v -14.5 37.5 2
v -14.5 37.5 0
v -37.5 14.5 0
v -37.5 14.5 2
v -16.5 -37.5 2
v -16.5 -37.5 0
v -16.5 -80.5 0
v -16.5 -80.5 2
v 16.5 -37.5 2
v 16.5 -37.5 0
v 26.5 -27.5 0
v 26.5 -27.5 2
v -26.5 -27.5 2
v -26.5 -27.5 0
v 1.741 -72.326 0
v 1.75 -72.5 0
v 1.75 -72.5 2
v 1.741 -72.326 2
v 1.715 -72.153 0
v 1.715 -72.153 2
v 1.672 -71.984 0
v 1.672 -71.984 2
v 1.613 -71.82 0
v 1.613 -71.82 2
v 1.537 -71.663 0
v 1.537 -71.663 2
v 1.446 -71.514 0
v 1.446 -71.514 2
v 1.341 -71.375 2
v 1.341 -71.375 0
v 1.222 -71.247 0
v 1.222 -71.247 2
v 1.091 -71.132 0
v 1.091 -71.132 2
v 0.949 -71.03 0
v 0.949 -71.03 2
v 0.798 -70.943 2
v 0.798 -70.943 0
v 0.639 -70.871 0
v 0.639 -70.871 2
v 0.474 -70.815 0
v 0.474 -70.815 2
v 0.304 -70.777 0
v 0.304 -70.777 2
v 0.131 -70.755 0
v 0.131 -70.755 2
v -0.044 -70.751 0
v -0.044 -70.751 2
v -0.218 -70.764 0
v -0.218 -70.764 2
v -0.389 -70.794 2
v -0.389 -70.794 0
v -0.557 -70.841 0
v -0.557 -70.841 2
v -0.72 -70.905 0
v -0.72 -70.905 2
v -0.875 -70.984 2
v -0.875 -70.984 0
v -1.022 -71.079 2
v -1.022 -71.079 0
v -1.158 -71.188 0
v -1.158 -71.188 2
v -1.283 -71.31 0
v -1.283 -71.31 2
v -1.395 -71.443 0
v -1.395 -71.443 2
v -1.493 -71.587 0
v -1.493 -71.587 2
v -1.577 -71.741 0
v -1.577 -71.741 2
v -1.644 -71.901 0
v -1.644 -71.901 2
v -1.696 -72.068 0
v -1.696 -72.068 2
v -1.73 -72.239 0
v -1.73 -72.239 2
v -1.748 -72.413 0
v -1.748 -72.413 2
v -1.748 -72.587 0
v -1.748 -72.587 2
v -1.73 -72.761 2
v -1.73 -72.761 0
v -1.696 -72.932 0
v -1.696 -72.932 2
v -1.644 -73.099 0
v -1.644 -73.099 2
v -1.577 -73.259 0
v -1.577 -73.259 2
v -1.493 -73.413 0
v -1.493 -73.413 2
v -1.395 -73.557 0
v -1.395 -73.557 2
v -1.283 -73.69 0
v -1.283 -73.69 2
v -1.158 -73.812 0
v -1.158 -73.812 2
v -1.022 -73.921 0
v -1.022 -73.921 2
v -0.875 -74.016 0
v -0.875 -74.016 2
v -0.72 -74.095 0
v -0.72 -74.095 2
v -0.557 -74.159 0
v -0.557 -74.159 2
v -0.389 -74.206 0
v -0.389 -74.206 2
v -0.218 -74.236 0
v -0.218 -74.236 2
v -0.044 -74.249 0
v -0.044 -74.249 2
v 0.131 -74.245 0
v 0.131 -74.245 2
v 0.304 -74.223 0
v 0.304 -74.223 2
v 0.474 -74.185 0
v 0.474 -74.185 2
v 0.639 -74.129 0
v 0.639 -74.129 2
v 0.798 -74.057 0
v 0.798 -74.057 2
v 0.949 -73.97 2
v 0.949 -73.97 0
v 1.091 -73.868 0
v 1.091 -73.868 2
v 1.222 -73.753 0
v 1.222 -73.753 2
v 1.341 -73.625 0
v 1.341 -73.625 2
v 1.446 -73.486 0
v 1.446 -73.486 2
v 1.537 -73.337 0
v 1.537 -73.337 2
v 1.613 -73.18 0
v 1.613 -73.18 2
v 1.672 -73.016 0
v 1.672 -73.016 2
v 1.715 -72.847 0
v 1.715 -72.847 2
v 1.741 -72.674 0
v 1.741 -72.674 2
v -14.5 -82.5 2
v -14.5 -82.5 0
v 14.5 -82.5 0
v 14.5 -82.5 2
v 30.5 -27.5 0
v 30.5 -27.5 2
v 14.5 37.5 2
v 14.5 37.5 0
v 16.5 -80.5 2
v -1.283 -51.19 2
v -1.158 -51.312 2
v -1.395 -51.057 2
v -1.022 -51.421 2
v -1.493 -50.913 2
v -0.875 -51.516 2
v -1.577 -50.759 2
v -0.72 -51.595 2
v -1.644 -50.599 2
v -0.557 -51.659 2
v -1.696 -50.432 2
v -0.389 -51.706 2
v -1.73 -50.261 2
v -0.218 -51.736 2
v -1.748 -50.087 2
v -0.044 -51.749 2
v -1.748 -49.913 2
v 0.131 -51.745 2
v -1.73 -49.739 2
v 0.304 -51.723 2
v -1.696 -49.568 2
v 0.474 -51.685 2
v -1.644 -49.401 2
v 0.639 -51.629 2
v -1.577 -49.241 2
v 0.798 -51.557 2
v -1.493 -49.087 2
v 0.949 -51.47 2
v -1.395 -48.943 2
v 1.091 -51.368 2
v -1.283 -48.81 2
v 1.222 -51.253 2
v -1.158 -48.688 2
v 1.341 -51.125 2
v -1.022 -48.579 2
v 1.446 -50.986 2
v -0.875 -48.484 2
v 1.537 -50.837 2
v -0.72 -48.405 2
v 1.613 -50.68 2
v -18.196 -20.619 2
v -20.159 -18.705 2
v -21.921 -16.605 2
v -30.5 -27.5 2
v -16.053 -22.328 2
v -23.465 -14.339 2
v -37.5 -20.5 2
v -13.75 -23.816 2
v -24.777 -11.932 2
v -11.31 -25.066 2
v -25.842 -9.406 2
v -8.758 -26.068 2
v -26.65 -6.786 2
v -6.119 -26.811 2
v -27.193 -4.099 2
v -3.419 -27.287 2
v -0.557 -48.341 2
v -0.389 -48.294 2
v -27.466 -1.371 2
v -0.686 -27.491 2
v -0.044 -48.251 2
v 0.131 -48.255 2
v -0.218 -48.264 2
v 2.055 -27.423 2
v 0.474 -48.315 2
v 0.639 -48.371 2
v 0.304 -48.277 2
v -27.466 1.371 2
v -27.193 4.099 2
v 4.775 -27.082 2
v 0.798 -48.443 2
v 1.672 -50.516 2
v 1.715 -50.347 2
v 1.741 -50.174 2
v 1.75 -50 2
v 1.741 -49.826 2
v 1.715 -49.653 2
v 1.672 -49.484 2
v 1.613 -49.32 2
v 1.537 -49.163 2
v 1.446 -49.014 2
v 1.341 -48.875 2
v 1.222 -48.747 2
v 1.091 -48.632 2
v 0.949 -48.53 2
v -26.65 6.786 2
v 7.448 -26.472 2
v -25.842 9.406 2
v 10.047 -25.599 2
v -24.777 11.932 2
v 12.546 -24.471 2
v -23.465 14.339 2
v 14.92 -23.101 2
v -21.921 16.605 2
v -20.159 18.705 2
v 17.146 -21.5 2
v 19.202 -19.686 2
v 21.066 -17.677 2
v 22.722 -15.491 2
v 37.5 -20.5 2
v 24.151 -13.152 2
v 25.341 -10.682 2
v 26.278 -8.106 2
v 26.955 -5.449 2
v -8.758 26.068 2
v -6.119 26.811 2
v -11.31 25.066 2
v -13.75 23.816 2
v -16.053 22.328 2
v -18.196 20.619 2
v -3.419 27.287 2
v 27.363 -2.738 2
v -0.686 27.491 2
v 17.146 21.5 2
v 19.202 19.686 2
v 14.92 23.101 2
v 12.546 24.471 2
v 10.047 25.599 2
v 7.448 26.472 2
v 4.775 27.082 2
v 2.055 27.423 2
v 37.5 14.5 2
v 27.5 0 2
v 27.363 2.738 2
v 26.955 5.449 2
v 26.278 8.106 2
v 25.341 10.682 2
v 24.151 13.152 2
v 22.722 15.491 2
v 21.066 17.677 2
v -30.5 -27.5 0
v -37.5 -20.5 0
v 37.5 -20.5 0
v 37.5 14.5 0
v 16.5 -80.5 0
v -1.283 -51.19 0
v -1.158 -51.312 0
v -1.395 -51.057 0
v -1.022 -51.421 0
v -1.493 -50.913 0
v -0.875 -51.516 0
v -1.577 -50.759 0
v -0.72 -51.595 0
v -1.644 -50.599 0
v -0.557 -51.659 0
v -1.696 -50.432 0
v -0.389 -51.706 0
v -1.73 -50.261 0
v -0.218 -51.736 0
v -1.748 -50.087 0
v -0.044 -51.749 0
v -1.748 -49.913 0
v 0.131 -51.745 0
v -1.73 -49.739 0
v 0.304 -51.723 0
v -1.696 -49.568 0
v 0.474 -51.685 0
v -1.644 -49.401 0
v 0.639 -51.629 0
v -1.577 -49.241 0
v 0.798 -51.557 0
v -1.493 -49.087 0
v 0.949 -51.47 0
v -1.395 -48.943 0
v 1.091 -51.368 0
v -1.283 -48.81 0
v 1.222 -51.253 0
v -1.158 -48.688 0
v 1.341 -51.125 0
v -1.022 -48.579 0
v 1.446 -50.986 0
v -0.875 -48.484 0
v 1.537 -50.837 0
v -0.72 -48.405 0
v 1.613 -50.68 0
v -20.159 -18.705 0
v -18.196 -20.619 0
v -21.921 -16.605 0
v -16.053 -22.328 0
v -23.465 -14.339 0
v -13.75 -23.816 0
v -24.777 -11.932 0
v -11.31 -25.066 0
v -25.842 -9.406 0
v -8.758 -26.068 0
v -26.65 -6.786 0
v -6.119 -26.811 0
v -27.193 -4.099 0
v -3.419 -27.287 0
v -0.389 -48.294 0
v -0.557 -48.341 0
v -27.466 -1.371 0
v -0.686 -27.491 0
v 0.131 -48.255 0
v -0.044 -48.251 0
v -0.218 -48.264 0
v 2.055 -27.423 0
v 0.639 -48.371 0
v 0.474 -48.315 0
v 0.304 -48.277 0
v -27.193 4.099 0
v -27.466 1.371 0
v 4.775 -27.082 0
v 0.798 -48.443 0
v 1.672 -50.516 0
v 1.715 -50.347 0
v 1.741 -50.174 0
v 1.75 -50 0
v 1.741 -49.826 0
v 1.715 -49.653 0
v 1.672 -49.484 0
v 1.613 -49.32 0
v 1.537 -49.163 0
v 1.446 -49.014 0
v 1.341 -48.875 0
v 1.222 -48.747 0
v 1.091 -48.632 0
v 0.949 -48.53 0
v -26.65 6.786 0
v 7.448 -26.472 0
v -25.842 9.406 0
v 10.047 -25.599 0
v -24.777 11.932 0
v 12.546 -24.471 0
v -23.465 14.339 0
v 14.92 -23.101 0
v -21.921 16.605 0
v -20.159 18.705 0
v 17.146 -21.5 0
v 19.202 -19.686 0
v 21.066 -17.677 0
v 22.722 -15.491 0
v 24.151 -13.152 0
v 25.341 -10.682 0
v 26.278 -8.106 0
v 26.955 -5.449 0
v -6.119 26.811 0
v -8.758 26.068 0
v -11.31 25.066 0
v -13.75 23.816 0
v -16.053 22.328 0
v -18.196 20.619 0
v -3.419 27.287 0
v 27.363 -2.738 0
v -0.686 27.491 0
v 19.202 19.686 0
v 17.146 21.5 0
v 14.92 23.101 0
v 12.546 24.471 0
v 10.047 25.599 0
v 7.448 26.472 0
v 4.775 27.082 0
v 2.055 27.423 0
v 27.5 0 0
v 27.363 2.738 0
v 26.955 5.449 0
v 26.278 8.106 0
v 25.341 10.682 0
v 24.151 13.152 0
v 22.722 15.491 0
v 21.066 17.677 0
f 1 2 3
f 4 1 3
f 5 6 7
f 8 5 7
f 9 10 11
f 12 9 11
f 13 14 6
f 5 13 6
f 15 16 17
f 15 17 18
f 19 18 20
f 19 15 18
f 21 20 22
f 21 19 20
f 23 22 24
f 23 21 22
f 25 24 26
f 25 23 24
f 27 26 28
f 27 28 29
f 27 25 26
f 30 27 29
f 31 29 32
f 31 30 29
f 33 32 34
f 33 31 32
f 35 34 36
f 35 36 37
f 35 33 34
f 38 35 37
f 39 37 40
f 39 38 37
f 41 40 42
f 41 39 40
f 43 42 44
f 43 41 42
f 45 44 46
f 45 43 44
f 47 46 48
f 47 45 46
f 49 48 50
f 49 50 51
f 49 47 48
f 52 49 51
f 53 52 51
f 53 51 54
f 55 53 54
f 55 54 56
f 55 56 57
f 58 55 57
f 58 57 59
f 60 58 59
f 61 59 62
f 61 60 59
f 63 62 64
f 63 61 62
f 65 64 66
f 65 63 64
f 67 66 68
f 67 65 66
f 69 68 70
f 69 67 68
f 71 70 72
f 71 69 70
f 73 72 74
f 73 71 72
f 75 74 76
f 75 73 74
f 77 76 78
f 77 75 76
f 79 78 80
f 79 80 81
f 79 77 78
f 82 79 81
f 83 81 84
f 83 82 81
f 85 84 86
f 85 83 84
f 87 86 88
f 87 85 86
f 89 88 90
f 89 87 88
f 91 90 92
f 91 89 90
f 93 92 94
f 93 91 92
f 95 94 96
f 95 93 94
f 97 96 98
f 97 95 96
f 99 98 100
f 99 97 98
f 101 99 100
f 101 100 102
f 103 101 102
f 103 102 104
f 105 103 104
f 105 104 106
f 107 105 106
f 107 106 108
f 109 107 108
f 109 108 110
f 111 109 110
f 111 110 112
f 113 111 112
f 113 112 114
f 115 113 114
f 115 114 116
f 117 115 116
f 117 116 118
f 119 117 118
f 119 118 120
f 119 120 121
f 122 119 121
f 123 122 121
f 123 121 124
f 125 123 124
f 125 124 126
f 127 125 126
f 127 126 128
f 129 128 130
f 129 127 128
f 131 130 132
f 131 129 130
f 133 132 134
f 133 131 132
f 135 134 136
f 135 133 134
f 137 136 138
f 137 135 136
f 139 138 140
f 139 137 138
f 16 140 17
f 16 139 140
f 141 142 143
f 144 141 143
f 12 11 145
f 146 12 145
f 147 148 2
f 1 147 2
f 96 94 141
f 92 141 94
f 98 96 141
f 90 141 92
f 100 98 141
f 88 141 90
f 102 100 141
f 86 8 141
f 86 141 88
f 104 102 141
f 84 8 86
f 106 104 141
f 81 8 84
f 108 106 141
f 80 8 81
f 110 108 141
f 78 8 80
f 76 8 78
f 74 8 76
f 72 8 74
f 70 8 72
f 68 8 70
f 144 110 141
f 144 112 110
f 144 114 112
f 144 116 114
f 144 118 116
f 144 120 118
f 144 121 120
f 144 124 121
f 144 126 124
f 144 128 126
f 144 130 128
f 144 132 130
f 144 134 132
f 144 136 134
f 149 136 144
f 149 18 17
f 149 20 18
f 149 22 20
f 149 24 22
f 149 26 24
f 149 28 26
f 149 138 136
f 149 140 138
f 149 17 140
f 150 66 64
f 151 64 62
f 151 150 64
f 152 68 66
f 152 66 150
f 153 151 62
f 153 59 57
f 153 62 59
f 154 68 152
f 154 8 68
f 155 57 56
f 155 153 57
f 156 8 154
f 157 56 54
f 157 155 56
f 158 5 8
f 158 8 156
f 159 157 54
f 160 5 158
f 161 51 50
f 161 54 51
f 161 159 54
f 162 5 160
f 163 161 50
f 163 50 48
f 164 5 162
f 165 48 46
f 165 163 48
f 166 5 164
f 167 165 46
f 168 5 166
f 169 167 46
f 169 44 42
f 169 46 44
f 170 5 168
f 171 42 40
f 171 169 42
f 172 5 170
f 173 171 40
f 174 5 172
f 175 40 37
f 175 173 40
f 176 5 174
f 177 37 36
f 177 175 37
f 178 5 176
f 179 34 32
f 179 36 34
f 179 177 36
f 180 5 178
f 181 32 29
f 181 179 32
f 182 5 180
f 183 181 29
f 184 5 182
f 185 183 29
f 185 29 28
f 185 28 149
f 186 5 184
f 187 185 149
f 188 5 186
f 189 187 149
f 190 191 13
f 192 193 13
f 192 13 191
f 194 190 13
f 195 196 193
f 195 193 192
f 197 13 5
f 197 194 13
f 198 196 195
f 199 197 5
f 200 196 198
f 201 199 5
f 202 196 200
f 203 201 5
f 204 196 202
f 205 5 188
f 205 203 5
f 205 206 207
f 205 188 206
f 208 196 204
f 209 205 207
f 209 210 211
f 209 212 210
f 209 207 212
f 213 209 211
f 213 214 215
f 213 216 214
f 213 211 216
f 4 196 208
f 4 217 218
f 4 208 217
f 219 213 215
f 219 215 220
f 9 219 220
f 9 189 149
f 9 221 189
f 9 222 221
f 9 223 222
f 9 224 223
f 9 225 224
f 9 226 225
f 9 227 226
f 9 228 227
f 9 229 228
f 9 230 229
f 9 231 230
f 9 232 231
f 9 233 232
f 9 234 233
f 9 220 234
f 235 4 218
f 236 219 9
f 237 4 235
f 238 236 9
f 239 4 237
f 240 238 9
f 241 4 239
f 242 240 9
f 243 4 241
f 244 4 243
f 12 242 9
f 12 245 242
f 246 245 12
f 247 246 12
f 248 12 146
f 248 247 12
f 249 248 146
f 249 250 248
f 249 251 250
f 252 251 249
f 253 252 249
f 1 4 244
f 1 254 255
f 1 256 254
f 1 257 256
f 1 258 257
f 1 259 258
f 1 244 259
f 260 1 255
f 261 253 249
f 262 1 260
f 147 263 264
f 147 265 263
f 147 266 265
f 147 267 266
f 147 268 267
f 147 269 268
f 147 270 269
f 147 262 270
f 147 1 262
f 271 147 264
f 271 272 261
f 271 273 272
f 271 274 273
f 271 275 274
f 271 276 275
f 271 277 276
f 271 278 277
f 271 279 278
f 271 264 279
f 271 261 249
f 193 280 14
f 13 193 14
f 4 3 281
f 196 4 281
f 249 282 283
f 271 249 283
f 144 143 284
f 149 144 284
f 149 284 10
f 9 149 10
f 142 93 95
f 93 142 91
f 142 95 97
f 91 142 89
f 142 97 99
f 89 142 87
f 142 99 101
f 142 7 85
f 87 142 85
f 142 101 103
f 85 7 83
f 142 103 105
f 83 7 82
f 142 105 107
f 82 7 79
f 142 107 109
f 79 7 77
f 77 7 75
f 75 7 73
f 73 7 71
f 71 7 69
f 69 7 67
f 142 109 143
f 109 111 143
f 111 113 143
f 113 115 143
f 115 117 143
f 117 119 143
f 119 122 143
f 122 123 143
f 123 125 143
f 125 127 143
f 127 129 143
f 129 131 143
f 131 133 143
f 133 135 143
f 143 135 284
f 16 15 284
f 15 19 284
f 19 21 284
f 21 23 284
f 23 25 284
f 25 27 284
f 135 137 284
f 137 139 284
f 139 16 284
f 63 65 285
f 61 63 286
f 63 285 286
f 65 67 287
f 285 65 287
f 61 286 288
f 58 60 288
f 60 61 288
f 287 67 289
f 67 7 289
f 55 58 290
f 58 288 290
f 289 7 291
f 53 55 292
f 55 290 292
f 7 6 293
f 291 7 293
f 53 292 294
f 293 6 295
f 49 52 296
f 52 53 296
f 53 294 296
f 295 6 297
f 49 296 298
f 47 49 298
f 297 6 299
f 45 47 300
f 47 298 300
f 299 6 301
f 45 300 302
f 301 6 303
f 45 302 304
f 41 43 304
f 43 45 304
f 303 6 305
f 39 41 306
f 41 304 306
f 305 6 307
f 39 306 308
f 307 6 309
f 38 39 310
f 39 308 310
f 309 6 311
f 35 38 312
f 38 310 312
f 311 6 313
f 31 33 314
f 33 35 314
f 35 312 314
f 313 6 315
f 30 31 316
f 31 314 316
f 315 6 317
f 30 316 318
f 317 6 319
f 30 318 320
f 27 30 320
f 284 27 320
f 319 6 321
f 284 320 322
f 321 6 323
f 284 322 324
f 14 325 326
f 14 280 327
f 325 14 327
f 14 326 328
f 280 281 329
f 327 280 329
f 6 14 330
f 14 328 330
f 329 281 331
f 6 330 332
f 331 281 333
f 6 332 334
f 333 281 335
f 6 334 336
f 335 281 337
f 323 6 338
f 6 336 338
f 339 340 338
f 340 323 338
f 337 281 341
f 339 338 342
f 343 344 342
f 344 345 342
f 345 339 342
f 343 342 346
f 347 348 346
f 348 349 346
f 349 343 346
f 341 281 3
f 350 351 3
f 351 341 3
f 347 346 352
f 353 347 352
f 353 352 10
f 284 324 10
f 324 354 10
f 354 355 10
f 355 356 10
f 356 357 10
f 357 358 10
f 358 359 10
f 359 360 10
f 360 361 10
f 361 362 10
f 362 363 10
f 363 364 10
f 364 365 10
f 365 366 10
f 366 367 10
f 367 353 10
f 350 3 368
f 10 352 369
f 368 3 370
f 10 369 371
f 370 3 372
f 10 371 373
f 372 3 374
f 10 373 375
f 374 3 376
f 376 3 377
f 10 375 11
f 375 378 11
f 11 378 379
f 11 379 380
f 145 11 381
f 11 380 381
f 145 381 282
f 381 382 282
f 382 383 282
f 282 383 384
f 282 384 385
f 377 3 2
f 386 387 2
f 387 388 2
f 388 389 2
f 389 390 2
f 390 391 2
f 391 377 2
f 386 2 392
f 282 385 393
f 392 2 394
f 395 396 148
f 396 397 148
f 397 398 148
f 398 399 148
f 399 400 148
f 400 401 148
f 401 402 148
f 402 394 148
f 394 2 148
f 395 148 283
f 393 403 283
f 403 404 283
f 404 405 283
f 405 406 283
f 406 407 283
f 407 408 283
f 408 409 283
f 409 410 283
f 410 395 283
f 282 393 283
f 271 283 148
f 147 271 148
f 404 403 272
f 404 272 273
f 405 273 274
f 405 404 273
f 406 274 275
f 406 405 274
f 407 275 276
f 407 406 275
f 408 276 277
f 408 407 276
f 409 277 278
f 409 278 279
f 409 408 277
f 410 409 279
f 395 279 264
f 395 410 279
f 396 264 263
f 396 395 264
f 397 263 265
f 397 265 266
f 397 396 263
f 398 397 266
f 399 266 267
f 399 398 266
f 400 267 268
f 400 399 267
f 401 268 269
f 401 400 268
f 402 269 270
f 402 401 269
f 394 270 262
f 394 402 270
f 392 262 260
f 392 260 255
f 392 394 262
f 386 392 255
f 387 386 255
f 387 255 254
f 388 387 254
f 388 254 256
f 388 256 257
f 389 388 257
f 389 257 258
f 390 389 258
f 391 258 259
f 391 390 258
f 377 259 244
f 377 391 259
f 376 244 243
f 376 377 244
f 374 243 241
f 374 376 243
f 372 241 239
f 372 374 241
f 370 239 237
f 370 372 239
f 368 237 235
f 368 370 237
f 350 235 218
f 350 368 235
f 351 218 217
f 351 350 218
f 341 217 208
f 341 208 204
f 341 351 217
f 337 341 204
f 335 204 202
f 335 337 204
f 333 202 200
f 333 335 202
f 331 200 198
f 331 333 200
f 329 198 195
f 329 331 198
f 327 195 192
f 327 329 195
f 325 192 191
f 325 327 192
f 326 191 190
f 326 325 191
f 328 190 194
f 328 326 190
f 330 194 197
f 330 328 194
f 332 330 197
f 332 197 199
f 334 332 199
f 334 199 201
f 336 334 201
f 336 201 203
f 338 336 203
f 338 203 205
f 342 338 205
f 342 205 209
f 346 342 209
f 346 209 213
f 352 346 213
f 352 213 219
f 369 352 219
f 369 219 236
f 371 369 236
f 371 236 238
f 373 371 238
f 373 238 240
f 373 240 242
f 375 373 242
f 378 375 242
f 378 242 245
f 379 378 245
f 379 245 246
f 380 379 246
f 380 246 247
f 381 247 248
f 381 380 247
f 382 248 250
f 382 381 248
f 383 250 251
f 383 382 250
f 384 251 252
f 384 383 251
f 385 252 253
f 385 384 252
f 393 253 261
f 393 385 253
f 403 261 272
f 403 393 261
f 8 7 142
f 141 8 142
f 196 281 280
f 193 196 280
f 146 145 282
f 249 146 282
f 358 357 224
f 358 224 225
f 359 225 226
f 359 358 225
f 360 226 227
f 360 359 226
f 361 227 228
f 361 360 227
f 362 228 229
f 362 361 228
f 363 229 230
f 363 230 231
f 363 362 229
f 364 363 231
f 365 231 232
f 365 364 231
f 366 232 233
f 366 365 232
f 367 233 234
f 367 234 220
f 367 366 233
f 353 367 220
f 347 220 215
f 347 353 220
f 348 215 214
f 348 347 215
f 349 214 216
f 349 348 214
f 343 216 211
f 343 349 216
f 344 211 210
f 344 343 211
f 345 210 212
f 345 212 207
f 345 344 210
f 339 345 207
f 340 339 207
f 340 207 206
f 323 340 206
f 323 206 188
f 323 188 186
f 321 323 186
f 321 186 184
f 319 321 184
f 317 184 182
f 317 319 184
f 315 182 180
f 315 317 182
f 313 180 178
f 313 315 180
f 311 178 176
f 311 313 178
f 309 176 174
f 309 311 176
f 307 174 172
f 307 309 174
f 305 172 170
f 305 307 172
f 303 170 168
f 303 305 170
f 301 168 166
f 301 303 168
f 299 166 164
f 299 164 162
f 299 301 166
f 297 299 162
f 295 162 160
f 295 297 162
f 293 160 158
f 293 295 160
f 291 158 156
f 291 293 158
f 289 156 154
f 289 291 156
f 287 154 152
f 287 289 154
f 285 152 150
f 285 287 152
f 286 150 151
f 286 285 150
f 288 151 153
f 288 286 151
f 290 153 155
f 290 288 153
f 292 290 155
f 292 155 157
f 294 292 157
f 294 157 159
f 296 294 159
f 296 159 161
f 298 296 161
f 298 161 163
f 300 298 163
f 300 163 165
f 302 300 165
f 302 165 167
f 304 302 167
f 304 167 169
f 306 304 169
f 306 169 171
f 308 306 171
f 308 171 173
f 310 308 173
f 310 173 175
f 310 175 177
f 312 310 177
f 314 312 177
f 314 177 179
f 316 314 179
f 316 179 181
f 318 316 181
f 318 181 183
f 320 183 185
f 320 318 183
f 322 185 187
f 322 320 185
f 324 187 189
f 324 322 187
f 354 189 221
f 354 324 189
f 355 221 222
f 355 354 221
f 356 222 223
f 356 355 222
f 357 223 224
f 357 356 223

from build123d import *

# Parameters (mm, degrees)
F0_R     = 1.75
F0_R_2   = 27.5
F1_DEPTH = 2


with BuildPart() as f1:
    # F0 (on Top) → F1 (new body)
    with BuildSketch(Plane.XY):
        Polygon((14.5, 37.5), (0, 37.5), (-14.5, 37.5), (-37.5, 14.5), (-37.5, -20.5), (-30.5, -27.5), (-26.5, -27.5), (-16.5, -37.5), (-16.5, -80.5), (-14.5, -82.5), (0, -82.5), (14.5, -82.5), (16.5, -80.5), (16.5, -37.5), (26.5, -27.5), (30.5, -27.5), (37.5, -20.5), (37.5, 14.5), align=None)
        with Locations((0, -72.5)):
            Circle(F0_R, mode=Mode.SUBTRACT)
        with Locations((0, -50)):
            Circle(F0_R, mode=Mode.SUBTRACT)
        Circle(F0_R_2, mode=Mode.SUBTRACT)
    extrude(amount=F1_DEPTH)


solid = f1.part
